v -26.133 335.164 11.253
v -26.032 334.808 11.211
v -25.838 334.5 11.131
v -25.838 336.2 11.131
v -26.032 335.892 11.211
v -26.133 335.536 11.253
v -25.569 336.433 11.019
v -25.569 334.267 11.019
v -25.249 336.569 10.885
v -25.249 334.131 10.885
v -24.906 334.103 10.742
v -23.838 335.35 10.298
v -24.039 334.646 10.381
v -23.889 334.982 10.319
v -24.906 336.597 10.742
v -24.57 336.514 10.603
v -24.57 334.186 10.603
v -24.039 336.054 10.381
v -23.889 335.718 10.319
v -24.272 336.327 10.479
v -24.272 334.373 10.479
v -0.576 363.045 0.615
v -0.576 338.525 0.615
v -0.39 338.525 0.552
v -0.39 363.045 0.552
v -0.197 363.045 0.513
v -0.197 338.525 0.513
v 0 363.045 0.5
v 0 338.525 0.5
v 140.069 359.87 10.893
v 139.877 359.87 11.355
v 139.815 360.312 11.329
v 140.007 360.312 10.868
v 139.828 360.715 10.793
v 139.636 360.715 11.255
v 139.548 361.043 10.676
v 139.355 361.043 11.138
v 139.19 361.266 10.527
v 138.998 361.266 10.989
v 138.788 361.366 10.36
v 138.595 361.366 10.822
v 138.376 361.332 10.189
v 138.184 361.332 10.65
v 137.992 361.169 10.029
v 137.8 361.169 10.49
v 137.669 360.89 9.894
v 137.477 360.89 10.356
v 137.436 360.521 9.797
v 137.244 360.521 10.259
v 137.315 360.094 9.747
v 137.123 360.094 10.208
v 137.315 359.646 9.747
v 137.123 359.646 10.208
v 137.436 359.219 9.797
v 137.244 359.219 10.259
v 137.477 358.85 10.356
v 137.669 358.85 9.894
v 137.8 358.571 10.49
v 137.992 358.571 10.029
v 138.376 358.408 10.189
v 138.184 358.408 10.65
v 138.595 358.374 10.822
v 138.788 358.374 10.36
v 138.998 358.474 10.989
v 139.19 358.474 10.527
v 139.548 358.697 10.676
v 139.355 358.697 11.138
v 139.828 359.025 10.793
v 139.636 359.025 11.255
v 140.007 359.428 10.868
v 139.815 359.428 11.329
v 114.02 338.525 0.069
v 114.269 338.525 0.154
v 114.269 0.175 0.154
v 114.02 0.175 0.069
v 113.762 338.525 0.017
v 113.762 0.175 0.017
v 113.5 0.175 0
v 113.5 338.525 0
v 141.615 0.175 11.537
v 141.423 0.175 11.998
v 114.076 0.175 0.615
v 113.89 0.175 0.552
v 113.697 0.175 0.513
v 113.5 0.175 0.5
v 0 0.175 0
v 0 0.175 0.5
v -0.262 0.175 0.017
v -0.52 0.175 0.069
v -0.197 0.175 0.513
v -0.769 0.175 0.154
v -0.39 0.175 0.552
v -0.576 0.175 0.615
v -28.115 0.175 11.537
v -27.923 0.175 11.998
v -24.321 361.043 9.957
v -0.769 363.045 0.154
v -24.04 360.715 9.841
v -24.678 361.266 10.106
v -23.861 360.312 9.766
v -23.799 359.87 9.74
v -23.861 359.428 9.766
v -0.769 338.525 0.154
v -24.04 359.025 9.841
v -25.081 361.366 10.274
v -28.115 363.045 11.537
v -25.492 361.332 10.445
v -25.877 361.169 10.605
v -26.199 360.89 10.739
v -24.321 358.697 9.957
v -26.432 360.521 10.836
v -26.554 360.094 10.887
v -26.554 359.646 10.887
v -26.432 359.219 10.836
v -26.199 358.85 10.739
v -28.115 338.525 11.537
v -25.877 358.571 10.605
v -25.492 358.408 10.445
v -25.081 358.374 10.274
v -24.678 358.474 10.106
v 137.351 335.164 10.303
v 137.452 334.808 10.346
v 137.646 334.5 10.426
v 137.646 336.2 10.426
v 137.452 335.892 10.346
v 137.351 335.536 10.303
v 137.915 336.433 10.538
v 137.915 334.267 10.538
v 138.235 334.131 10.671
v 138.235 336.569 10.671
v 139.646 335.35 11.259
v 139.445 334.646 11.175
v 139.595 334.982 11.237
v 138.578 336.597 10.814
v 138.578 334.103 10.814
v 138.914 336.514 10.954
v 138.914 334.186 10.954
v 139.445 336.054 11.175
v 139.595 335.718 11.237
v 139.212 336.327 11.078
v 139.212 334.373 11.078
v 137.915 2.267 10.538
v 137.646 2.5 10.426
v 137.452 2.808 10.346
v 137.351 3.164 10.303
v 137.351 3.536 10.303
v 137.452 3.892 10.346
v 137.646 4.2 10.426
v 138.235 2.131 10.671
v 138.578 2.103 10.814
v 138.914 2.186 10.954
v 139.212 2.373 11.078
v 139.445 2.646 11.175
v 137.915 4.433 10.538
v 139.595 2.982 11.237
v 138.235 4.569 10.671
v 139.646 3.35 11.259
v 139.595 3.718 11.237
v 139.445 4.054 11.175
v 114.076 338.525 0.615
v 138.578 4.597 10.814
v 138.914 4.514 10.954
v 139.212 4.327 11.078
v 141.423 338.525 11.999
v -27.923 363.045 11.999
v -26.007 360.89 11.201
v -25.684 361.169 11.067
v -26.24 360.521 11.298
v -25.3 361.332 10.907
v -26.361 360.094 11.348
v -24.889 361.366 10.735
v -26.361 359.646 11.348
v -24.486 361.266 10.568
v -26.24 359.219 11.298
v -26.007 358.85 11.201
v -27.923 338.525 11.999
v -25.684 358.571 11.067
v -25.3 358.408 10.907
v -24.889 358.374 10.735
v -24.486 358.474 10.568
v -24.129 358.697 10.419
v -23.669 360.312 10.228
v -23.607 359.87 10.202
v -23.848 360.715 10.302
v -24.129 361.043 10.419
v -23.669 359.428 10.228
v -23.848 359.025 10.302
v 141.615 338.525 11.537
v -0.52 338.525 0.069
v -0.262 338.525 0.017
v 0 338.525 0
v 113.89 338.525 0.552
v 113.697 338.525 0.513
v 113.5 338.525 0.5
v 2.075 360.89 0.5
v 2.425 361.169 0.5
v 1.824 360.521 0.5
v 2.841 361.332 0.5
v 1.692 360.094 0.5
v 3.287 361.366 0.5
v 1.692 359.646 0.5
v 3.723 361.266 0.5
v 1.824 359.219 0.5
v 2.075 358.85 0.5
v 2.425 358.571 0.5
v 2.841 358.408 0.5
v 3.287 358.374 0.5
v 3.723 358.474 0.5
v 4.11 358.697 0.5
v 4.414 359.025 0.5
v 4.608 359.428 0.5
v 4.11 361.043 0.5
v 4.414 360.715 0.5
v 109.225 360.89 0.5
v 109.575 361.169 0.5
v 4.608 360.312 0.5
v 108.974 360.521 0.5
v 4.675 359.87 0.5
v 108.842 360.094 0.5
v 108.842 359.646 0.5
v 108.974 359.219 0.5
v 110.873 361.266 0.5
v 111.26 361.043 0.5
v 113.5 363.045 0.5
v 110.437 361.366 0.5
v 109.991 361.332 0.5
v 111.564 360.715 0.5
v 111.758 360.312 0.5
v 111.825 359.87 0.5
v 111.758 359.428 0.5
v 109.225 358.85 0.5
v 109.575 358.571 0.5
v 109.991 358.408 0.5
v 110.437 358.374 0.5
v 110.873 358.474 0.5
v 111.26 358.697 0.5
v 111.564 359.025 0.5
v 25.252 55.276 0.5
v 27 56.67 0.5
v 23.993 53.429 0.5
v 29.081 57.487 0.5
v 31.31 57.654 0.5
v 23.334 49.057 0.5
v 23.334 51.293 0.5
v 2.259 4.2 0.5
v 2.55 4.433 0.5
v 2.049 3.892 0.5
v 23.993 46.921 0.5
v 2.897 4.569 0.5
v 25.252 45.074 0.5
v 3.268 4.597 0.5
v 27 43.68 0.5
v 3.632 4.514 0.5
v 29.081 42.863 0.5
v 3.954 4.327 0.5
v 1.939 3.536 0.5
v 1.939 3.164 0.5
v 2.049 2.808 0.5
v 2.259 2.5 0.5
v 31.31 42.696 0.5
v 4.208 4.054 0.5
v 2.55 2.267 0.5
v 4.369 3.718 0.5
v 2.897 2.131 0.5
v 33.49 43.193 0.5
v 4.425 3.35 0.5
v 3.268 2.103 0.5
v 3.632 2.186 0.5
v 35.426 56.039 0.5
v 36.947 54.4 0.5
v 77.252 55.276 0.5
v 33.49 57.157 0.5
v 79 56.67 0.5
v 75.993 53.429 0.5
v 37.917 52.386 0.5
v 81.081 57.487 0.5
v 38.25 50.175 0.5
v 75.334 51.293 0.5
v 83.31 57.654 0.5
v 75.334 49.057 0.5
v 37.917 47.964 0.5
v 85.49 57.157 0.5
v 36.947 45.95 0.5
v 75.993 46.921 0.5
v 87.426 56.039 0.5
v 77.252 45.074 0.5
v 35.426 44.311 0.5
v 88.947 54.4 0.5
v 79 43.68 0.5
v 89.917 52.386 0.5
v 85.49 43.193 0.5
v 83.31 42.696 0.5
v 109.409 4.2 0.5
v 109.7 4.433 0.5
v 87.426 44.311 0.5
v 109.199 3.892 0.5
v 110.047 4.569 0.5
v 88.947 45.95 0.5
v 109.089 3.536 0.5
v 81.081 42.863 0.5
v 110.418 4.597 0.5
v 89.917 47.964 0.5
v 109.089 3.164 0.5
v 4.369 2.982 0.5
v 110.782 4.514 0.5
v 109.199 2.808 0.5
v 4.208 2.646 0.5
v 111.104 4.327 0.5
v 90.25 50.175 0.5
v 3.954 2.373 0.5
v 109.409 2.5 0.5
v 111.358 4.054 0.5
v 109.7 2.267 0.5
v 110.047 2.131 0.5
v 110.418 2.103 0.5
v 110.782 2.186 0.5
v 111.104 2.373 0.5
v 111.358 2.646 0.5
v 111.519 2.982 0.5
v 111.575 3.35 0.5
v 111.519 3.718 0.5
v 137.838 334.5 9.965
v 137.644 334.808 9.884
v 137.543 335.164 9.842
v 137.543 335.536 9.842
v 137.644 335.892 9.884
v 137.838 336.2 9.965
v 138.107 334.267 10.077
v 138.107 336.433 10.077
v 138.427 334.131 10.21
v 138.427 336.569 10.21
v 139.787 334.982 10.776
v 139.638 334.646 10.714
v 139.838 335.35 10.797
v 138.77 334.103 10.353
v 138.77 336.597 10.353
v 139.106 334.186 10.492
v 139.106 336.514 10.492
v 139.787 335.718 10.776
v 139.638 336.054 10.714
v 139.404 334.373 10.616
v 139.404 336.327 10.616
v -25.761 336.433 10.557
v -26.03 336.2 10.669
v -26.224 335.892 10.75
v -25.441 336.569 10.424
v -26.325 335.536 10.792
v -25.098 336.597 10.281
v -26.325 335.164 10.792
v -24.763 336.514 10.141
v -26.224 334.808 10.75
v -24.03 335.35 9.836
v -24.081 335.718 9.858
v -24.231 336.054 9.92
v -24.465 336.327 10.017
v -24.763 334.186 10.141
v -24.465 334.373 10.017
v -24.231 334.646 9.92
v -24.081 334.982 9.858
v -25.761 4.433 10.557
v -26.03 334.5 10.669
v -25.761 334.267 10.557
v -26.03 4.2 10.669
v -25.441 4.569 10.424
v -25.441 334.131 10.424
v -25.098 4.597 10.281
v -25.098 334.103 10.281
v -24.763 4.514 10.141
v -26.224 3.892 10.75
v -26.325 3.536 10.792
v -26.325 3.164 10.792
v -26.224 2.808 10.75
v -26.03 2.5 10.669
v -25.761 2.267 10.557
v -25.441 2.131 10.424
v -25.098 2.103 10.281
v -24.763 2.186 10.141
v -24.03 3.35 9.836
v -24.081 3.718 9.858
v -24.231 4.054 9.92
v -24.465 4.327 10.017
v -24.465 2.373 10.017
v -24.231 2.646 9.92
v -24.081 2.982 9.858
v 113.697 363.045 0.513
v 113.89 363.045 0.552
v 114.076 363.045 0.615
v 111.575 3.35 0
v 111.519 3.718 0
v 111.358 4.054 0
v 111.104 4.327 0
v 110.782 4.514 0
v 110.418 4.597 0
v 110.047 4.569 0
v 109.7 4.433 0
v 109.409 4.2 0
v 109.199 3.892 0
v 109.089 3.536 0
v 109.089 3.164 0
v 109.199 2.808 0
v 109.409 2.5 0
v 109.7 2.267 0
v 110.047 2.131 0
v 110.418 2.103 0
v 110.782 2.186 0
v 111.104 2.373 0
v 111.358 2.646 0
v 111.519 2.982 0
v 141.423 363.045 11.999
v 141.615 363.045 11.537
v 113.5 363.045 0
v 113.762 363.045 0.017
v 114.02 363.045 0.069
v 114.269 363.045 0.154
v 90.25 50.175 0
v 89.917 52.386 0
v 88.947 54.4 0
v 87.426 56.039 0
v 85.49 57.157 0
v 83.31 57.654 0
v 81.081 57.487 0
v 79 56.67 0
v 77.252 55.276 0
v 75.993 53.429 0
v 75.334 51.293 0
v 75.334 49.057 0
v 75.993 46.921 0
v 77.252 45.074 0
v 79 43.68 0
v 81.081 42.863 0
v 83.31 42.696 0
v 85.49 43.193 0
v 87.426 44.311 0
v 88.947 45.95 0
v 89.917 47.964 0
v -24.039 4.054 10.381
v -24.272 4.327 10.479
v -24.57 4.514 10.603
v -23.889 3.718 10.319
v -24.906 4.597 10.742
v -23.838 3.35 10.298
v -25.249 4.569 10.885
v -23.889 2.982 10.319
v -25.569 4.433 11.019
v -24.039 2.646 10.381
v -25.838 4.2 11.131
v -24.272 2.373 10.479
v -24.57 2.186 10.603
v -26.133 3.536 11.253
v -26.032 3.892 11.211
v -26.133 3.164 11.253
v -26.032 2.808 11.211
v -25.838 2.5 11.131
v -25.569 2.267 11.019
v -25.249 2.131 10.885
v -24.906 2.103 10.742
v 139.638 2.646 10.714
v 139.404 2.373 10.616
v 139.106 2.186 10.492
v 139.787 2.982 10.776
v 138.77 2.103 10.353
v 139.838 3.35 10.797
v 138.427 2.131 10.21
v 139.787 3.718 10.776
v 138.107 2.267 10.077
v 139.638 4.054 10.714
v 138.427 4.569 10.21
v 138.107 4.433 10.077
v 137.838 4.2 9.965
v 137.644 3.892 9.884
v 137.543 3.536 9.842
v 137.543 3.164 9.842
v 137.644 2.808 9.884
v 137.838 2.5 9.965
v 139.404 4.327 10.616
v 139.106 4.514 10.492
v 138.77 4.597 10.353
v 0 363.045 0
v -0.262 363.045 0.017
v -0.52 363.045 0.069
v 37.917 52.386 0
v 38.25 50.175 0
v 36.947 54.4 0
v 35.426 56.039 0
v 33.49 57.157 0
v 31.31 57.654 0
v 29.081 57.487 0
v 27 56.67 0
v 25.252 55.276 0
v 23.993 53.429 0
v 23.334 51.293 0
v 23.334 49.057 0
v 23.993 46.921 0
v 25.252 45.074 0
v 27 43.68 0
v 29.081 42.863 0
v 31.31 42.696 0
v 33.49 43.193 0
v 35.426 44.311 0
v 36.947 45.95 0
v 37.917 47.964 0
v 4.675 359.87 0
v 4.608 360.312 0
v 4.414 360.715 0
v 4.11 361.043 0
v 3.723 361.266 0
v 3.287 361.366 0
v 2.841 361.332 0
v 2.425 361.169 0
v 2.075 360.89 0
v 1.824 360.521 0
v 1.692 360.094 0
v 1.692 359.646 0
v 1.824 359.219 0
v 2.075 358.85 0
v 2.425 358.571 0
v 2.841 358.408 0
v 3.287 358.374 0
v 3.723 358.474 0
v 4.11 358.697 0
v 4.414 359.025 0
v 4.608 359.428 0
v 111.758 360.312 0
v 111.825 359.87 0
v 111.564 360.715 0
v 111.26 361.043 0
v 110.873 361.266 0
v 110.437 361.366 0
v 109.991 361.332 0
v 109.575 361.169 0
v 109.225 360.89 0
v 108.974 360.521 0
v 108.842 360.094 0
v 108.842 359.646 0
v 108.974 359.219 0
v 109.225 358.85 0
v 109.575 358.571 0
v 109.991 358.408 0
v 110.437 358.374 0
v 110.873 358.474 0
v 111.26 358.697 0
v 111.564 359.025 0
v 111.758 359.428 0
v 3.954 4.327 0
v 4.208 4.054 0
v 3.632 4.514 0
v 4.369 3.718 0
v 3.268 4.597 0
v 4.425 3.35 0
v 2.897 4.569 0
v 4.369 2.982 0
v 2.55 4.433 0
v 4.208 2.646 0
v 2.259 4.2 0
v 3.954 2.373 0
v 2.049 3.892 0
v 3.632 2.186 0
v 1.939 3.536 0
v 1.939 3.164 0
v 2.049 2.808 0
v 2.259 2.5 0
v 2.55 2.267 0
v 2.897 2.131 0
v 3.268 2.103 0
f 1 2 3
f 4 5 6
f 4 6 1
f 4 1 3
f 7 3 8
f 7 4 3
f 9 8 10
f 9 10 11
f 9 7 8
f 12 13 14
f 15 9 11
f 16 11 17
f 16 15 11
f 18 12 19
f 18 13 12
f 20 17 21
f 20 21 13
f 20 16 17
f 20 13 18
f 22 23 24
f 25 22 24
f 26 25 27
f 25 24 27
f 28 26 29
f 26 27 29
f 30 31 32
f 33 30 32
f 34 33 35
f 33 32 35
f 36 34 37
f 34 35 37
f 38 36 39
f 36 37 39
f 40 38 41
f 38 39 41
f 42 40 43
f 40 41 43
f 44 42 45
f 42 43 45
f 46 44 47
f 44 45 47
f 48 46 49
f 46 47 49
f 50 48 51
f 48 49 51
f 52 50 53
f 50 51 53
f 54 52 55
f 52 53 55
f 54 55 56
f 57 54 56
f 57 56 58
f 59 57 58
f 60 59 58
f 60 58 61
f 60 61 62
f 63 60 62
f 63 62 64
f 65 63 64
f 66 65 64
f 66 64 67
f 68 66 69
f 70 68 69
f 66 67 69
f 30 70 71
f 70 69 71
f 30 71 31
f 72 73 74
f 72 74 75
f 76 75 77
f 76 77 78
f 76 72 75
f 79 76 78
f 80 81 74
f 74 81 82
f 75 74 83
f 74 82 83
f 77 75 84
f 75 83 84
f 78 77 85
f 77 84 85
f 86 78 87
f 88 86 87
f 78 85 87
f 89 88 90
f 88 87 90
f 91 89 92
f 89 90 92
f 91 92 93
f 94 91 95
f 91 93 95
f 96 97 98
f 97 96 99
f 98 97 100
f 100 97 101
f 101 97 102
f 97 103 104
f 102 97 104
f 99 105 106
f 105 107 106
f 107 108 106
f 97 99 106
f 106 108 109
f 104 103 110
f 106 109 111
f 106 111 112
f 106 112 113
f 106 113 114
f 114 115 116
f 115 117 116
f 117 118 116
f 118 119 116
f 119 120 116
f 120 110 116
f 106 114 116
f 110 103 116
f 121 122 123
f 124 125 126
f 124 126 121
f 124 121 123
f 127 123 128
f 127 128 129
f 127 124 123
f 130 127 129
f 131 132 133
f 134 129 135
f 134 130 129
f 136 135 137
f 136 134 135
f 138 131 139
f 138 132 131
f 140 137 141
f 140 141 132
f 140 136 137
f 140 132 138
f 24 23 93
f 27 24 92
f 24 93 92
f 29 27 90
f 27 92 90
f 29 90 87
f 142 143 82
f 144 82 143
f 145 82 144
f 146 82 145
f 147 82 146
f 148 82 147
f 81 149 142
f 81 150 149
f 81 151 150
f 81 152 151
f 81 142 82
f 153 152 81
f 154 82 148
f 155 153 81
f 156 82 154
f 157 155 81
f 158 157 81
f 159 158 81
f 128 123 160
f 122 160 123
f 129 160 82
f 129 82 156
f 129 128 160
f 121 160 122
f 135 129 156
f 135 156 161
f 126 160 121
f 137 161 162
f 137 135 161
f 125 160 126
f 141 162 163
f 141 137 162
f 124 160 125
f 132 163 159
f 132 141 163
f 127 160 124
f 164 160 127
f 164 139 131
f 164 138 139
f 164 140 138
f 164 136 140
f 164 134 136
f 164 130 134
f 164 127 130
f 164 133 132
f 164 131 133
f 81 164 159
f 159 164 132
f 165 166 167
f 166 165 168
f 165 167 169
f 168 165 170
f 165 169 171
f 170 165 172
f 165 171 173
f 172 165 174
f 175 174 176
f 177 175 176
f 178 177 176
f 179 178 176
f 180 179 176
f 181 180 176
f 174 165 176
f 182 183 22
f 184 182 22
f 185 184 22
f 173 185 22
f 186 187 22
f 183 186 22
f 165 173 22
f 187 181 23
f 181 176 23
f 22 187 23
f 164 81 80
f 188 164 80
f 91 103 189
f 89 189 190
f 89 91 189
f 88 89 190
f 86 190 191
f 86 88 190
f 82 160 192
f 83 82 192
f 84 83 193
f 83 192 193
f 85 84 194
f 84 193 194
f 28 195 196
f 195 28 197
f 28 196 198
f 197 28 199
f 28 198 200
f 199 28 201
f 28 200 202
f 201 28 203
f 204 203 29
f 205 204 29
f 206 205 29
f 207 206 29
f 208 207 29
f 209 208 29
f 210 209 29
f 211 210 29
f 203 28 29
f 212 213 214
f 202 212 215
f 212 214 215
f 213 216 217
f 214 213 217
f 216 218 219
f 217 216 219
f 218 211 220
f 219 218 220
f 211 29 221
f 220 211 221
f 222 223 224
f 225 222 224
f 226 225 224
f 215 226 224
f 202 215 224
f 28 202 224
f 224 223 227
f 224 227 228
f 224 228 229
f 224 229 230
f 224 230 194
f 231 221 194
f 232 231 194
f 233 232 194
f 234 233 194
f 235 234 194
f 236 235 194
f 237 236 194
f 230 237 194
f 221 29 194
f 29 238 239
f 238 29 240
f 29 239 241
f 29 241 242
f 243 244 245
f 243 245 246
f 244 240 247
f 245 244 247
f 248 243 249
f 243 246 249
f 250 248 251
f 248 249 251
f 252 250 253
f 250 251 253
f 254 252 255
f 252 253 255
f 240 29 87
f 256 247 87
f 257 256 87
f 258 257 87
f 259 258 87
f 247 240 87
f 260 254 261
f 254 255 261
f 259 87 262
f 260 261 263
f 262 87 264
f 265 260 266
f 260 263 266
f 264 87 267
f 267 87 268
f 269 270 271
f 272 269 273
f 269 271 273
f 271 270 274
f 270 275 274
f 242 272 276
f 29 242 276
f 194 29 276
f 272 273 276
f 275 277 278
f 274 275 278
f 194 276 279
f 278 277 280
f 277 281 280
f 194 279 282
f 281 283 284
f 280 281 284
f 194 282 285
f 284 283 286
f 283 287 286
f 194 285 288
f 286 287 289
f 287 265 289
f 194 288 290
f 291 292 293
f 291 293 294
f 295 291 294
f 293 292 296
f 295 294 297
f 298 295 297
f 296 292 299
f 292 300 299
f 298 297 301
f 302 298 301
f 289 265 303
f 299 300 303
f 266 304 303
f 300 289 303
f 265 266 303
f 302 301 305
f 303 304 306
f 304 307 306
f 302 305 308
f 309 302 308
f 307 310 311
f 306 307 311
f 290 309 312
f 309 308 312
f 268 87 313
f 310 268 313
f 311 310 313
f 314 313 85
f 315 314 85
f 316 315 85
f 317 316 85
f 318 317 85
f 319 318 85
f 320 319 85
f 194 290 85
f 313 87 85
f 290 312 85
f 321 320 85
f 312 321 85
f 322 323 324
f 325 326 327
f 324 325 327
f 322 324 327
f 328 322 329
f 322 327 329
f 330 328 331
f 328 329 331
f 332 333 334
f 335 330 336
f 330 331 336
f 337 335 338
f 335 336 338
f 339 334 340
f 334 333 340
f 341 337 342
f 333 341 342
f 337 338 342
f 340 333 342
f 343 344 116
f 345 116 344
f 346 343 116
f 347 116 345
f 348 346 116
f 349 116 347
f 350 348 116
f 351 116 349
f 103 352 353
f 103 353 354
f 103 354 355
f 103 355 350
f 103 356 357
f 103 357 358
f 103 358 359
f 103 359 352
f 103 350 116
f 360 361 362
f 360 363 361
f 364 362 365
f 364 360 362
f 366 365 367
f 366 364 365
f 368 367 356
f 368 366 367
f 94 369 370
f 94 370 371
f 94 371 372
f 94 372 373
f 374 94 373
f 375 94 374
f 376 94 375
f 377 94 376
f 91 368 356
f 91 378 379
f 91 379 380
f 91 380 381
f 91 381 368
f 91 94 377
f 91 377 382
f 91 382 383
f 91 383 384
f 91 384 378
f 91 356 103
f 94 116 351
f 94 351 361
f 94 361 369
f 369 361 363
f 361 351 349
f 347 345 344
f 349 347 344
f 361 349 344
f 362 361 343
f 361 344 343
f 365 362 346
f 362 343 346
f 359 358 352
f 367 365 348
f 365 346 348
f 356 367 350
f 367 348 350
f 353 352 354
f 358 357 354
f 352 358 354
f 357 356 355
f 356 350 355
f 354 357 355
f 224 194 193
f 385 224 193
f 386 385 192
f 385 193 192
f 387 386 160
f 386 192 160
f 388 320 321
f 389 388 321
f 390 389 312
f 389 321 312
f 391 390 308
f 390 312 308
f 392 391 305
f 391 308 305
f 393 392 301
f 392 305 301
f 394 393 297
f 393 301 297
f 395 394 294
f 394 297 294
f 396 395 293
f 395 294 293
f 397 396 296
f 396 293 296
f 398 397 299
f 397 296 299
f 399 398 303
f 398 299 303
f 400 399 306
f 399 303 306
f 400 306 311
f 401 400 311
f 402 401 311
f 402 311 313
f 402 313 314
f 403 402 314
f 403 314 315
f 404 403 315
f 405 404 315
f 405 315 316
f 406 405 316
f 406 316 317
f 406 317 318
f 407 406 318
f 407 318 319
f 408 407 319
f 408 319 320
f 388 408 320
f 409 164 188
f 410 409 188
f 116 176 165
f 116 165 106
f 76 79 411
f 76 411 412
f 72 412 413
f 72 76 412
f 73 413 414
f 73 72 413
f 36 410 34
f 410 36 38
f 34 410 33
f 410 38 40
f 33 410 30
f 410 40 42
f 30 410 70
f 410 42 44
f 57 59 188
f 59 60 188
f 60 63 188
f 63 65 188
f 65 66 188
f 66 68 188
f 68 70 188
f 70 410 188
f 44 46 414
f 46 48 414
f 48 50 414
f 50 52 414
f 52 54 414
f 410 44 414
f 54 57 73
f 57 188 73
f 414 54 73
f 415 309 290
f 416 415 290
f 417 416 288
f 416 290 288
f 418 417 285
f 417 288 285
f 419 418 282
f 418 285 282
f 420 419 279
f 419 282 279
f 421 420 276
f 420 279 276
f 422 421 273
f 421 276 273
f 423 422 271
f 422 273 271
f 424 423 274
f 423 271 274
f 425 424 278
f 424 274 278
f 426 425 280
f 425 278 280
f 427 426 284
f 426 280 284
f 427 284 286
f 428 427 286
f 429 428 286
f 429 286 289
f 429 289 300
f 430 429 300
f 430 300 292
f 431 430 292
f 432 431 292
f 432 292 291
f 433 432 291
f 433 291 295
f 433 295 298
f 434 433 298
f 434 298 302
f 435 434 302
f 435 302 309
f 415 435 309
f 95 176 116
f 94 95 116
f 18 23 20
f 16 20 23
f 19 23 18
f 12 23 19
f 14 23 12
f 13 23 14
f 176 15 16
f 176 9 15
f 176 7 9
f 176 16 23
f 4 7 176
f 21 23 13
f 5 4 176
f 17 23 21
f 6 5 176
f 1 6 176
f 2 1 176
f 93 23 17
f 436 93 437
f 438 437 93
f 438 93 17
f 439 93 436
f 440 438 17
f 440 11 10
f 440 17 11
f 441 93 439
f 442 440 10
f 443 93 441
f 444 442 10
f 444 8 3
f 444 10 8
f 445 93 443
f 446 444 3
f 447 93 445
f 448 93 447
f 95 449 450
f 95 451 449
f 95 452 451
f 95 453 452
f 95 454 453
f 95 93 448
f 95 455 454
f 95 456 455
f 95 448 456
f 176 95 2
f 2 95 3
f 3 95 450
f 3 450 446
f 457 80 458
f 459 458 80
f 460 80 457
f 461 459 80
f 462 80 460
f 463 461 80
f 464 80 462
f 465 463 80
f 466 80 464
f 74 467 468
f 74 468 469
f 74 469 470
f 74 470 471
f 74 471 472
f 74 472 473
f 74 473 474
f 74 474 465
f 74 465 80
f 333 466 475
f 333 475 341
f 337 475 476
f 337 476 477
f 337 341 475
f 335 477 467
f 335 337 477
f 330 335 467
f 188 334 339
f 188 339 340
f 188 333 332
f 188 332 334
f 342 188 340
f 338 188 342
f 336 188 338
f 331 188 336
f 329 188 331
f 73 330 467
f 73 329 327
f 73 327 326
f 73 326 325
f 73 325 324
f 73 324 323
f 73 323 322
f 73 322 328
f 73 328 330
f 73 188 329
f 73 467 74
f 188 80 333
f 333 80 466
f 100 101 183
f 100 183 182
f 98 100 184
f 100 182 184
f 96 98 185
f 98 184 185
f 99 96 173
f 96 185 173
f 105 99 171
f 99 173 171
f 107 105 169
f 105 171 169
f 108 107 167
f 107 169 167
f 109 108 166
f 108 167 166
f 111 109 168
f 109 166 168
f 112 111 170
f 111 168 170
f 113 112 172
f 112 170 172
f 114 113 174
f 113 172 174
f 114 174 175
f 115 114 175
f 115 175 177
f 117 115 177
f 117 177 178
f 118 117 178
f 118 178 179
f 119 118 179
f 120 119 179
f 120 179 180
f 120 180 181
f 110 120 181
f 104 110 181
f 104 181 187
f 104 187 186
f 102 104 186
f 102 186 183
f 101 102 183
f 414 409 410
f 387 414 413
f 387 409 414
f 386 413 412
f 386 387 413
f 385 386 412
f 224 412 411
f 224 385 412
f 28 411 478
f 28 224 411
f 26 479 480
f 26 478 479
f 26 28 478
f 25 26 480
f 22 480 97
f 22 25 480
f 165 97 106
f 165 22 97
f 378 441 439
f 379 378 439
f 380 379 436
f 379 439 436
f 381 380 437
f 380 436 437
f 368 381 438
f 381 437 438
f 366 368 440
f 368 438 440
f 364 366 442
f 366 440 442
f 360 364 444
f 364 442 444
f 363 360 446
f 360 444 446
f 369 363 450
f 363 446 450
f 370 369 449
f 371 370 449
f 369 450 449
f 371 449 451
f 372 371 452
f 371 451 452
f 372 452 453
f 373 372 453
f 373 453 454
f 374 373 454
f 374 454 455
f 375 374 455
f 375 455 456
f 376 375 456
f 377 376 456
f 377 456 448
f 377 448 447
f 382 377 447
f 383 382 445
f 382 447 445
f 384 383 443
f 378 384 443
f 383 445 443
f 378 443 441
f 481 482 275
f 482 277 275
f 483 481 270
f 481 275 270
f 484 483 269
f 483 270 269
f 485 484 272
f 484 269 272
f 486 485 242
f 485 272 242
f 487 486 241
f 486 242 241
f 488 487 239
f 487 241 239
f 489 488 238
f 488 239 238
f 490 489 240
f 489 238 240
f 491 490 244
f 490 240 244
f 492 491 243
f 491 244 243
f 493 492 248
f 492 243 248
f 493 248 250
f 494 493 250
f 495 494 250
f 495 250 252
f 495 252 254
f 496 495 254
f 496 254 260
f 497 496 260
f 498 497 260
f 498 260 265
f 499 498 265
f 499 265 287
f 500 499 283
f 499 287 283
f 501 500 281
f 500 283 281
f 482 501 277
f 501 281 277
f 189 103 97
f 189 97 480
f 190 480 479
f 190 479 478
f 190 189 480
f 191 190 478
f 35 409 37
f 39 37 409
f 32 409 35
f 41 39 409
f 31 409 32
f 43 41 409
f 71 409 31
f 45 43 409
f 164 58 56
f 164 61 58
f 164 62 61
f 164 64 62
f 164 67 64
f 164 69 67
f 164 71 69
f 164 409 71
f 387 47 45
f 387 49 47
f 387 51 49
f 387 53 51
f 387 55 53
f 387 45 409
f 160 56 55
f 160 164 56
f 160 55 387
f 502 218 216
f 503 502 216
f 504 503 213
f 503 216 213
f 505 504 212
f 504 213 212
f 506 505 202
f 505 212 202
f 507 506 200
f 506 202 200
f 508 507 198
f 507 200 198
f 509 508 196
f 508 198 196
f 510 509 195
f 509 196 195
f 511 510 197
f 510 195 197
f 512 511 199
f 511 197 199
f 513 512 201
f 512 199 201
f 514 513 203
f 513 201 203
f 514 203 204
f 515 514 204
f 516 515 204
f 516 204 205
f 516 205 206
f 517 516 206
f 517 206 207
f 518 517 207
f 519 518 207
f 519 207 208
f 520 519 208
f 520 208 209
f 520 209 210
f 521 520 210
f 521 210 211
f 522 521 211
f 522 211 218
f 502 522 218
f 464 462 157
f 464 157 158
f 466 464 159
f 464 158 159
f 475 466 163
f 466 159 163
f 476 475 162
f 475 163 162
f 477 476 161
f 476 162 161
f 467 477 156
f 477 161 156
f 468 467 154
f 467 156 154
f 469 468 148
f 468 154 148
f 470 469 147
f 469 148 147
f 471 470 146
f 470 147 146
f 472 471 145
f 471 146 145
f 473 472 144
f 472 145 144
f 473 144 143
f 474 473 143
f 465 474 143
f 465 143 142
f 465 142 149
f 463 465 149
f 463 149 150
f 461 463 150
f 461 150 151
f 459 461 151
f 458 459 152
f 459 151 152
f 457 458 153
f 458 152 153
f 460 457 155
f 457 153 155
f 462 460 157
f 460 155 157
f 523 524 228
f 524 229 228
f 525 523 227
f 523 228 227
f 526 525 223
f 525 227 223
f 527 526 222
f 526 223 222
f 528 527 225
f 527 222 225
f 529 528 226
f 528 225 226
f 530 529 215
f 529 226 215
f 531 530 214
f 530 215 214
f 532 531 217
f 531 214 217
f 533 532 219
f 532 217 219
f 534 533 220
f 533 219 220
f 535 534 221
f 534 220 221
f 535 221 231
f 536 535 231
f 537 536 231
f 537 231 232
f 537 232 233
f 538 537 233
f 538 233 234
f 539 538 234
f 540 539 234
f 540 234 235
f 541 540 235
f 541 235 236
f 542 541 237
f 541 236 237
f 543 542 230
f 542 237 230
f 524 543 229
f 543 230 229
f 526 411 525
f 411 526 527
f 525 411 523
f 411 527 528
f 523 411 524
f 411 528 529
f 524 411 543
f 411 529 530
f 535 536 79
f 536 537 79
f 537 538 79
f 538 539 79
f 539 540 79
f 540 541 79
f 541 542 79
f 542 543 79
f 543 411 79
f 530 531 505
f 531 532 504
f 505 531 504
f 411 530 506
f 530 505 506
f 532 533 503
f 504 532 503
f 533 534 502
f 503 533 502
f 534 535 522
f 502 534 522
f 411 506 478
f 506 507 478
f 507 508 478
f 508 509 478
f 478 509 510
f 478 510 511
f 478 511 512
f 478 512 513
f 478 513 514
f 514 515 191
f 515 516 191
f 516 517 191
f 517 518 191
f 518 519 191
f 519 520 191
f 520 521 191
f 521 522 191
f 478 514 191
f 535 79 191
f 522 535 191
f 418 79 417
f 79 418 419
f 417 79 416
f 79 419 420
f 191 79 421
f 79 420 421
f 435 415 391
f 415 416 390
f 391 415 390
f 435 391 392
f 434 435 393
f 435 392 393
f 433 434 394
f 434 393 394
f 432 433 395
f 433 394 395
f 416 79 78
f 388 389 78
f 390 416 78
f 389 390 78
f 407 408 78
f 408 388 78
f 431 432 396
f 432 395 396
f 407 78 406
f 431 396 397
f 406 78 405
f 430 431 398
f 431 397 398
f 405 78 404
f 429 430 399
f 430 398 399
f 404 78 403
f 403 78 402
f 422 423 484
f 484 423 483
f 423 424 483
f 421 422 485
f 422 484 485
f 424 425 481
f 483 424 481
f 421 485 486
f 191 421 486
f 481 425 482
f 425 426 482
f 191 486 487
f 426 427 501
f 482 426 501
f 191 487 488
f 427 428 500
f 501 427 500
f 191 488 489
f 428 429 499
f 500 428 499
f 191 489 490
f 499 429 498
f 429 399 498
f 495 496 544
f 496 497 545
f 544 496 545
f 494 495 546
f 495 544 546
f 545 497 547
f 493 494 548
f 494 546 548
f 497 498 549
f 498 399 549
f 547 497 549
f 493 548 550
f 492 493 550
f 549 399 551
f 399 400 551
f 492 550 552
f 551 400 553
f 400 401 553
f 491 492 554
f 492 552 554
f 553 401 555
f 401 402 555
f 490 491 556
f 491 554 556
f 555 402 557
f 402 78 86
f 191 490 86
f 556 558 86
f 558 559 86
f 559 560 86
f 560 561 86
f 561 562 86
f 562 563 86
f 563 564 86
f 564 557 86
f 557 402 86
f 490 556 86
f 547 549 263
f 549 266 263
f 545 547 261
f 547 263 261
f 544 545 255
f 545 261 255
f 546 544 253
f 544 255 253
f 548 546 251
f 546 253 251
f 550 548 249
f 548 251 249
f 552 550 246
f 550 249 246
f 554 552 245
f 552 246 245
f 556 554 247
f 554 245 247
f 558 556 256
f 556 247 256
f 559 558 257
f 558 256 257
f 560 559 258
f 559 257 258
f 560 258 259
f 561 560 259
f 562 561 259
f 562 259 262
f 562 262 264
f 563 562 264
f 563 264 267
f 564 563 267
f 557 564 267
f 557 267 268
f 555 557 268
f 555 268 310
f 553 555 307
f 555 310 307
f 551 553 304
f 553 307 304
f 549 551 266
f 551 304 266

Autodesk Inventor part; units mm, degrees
ref_plane "YZ Plane" through (0, 0, 0) normal (1, 0, 0) x (0, 1, 0)
ref_plane "XZ Plane" through (0, 0, 0) normal (0, 1, 0) x (-1, 0, 0)
ref_plane "XY Plane" through (0, 0, 0) normal (0, 0, 1) x (1, 0, 0)
sketch "Sketch1" plane through (0, 0, 0) normal (0, 0, 1) x (1, 0, 0)
  line L0 (0, 0) -> (113.5, 0)
  line L1 (113.5, 0) -> (113.5, 338.525)
  line L2 (113.5, 338.525) -> (0, 338.525)
  line L3 (0, 338.525) -> (0, 0)
  dimension "d0" = 113.5
  dimension "d1" = 338.525
extrude "Plate1" add sketch "Sketch1" along normal blind 0.5
sketch "Sketch2" plane through (114.0764, 338.525, 0.6152) normal (0.3842953, 0, -0.9232102) x (0, 1, 0)
  line L0 (-338.525, 0) -> (0, 0)
  line L1 (0, 0) -> (0, 29.6214)
  line L2 (0, 29.6214) -> (-338.525, 29.6214)
  line L3 (-338.525, 29.6214) -> (-338.525, 0)
edge flange "Flange1" height 30.021 angle 22.6 thickness 0.5 bend radius 1.5 thickness toward (0.3842953, 0, -0.9232102) relief tear relief width 0.5 relief depth 0.25 edges at (113.5, 169.2625, 0.5) wall of the first edge with corners at (114.0764, 0, 0.6152) (114.0764, 338.525, 0.6152) (141.4232, 338.525, 11.9985) (141.4232, 0, 11.9985)
bend "Bend1"
corner "Corner1"
sketch "Sketch3" plane through (-0.5764, 0, 0.6152) normal (-0.3842953, 0, -0.9232102) x (0, -1, 0)
  line L0 (-338.525, 0) -> (0, 0)
  line L1 (0, 0) -> (0, 29.6214)
  line L2 (0, 29.6214) -> (-338.525, 29.6214)
  line L3 (-338.525, 29.6214) -> (-338.525, 0)
edge flange "Flange2" height 30.021 angle 22.6 thickness 0.5 bend radius 1.5 thickness toward (-0.3842953, 0, -0.9232102) relief tear relief width 0.5 relief depth 0.25 edges at (0, 169.2625, 0.5) wall of the first edge with corners at (-0.5764, 338.525, 0.6152) (-0.5764, 0, 0.6152) (-27.9232, 0, 11.9985) (-27.9232, 338.525, 11.9985)
bend "Bend2"
corner "Corner2"
sketch "Sketch4" plane through (-27.9232, 0, 11.9985) normal (0.3842953, 0, 0.9232102) x (0.9232102, 0, -0.3842953)
  line L0 (0, 338.525) -> (0, 0) projected
  line L1 (0, 338.525) -> (0, 335.35) construction
  line L2 (0, 335.35) -> (3.175, 335.35) construction
  circle A0 centre (3.175, 335.35) radius 1.25
  line L3 (0, 0) -> (0, 3.175) construction
  line L4 (0, 3.175) -> (3.175, 3.175) construction
  line L5 (3.175, 3.175) -> (3.175, 3.35) construction
  circle A1 centre (3.175, 3.35) radius 1.25
  point P0 (30.39, 0)
  dimension "d23" = 3.175
  dimension "d24" = 3.175
  dimension "d25" = 2.5
  dimension "d26" = 3.175
  dimension "d27" = 3.175
  dimension "d62" = 0.175
  dimension "d63" = 2.5
extrude "Extrusion1" cut sketch "Sketch4" against normal blind 10
sketch "Sketch5" plane through (0, 0, 0.5) normal (0, 0, 1) x (1, 0, 0)
  line L0 (0, 0) -> (0, 338.525) projected
  line L1 (113.5, 0) -> (0, 0) projected
  line L2 (113.5, 338.525) -> (113.5, 0) projected
  line L3 (0, 338.525) -> (0, 335.35) construction
  line L4 (0, 335.35) -> (3.175, 335.35) construction
  line L5 (113.5, 338.525) -> (113.5, 335.35) construction
  line L6 (113.5, 335.35) -> (110.325, 335.35) construction
  line L7 (0, 0) -> (3.175, 0) construction
  line L8 (0, 0) -> (113.5, 0) construction
  line L9 (3.175, 0) -> (3.175, 3.175) construction
  line L10 (113.5, 0) -> (113.5, 3.175) construction
  line L11 (113.5, 3.175) -> (110.325, 3.175) construction
  circle A0 centre (3.175, 335.35) radius 1.25
  circle A1 centre (110.325, 335.35) radius 1.25
  line L12 (3.175, 3.175) -> (3.175, 3.35) construction
  line L13 (110.325, 3.175) -> (110.325, 3.35) construction
  circle A2 centre (110.325, 3.35) radius 1.25
  circle A3 centre (3.175, 3.35) radius 1.25
  dimension "d31" = 3.175
  dimension "d32" = 3.175
  dimension "d33" = 3.175
  dimension "d34" = 3.175
  dimension "d35" = 3.175
  dimension "d36" = 3.175
  dimension "d37" = 3.175
  dimension "d38" = 3.175
  dimension "d41" = 2.5
  dimension "d42" = 2.5
  dimension "d58" = 0.175
  dimension "d59" = 0.175
  dimension "d60" = 2.5
  dimension "d61" = 2.5
extrude "Extrusion2" cut sketch "Sketch5" against normal blind 10
sketch "Sketch6" plane through (141.4232, 0, 11.9985) normal (-0.3842953, 0, 0.9232102) x (0.9232102, 0, 0.3842953)
  line L0 (0, 338.525) -> (0, 335.35) construction
  line L1 (0, 0) -> (0, 338.525) construction
  line L2 (0, 335.35) -> (-3.175, 335.35) construction
  line L3 (0, 0) -> (0, 3.175) construction
  line L4 (0, 3.175) -> (-3.175, 3.175) construction
  circle A0 centre (-3.175, 335.35) radius 1.25
  line L5 (-3.175, 3.175) -> (-3.175, 3.35) construction
  circle A1 centre (-3.175, 3.35) radius 1.25
  point P0 (-135.1743, 0)
  dimension "d45" = 3.175
  dimension "d46" = 3.175
  dimension "d47" = 3.175
  dimension "d48" = 3.175
  dimension "d50" = 2.5
  dimension "d64" = 0.175
  dimension "d65" = 2.5
extrude "Extrusion3" cut sketch "Sketch6" against normal blind 10
sketch "Sketch7" plane through (0, 0, 0.5) normal (0, 0, 1) x (1, 0, 0)
  line L0 (-71.3896, 0) -> (266.456, 0)
  line L1 (266.456, 0) -> (266.456, 0.175)
  line L2 (266.456, 0.175) -> (-71.3896, 0.175)
  line L3 (-71.3896, 0.175) -> (-71.3896, 0)
  dimension "d53" = 0.175
extrude "Extrusion4" cut sketch "Sketch7" against normal blind 100 and the other way blind 100
sketch "Sketch9" plane through (-28.1153, 338.525, 11.5369) normal (0, 1, 0) x (0.9232102, 0, -0.3842953)
  line L0 (29.6214, -0.5) -> (29.6214, 0) projected
  line L1 (29.6214, 0) -> (0, 0) projected
  line L2 (0, -0.5) -> (0, 0) projected
  line L3 (0, -0.5) -> (29.6214, -0.5) projected
  point P0 (30.39, -0.1536)
extrude "Extrusion5" add sketch "Sketch9" along normal blind 30.87
sketch "Sketch10" plane through (0, 338.525, 0.5) normal (0, 1, 0) x (1, 0, 0)
  line L0 (-0.5764, -0.1152) -> (-0.7686, 0.3464) projected
  arc A0 (0, 0) -> (-0.5764, -0.1152) centre (0, -1.5) ccw projected
  line L1 (0, 0.5) -> (0, 0) projected
  arc A1 (0, 0.5) -> (-0.7686, 0.3464) centre (0, -1.5) ccw projected
extrude "Extrusion6" add sketch "Sketch10" along normal blind 30.87
sketch "Sketch11" plane through (0, 338.525, 0) normal (0, 1, 0) x (1, 0, 0)
  line L0 (0, -0.5) -> (113.5, -0.5) projected
  line L1 (113.5, 0) -> (113.5, -0.5) projected
  line L2 (113.5, 0) -> (0, 0) projected
  line L3 (0, 0) -> (0, -0.5) projected
extrude "Extrusion7" add sketch "Sketch11" along normal blind 30.87
sketch "Sketch12" plane through (113.5, 338.525, 0.5) normal (0, 1, 0) x (1, 0, 0)
  line L0 (0.7686, 0.3464) -> (0.5764, -0.1152) projected
  arc A0 (0.7686, 0.3464) -> (0, 0.5) centre (0, -1.5) ccw projected
  line L1 (0, 0.5) -> (0, 0) projected
  arc A1 (0.5764, -0.1152) -> (0, 0) centre (0, -1.5) ccw projected
  point P0 (-113.5, 0.5)
extrude "Extrusion8" add sketch "Sketch12" along normal blind 30.87
sketch "Sketch13" plane through (114.0764, 338.525, 0.6152) normal (0, 1, 0) x (0.9232102, 0, 0.3842953)
  line L0 (0, 0.5) -> (0, 0) projected
  line L1 (29.6214, 0) -> (0, 0) projected
  line L2 (29.6214, 0) -> (29.6214, 0.5) projected
  line L3 (29.6214, 0.5) -> (0, 0.5) projected
  point P0 (-105.553, -43.2711)
extrude "Extrusion9" add sketch "Sketch13" along normal blind 30.87
sketch "Sketch14" plane through (0, 0, 0.5) normal (0, 0, 1) x (1, 0, 0)
  circle A0 centre (3.175, 335.35) radius 1.25 projected
  point P0 (0, 0)
extrude "Extrusion10" add sketch "Sketch14" against normal up to surface (0.5 mm away)
sketch "Sketch15" plane through (0, 0, 0.5) normal (0, 0, 1) x (1, 0, 0)
  circle A0 centre (110.325, 335.35) radius 1.25 projected
  point P0 (0, 0)
extrude "Extrusion11" add sketch "Sketch15" against normal up to surface (0.5 mm away)
sketch "Sketch16" plane through (141.4232, 0.175, 11.9985) normal (-0.3842953, 0, 0.9232102) x (0.9232102, 0, 0.3842953)
  circle A0 centre (-3.175, 335.175) radius 1.25 projected
  point P0 (-135.1743, -0.175)
extrude "Extrusion12" add sketch "Sketch16" against normal up to surface (0.5 mm away)
sketch "Sketch17" plane through (-0.5764, 0.175, 0.6152) normal (0.3842953, 0, 0.9232102) x (0.9232102, 0, -0.3842953)
  circle A0 centre (-26.4464, 335.175) radius 1.25 projected
  point P0 (0.7686, -0.175)
extrude "Extrusion13" add sketch "Sketch17" against normal up to surface (0.5 mm away)
sketch "Sketch18" plane through (0, 0, 0.5) normal (0, 0, 1) x (1, 0, 0)
  line L0 (113.5, 0.175) -> (113.5, 369.395) projected
  line L1 (0, 0.175) -> (0, 369.395) projected
  line L2 (0, 369.395) -> (0, 359.87) construction
  line L3 (0, 359.87) -> (3.175, 359.87) construction
  circle A0 centre (3.175, 359.87) radius 1.5
  line L4 (113.5, 369.395) -> (113.5, 359.87) construction
  line L5 (113.5, 359.87) -> (110.325, 359.87) construction
  circle A1 centre (110.325, 359.87) radius 1.5
  point P0 (0, 0)
  dimension "d84" = 9.525
  dimension "d85" = 3.175
  dimension "d86" = 3
  dimension "d87" = 9.525
  dimension "d88" = 3.175
  dimension "d89" = 3
extrude "Extrusion14" cut sketch "Sketch18" against normal blind 30.87
sketch "Sketch19" plane through (-0.5764, 0.175, 0.6152) normal (0.3842953, 0, 0.9232102) x (0.9232102, 0, -0.3842953)
  line L0 (-29.6214, 369.22) -> (-29.6214, 0) projected
  line L1 (-29.6214, 369.22) -> (-29.6214, 359.695) construction
  line L2 (-29.6214, 359.695) -> (-26.4464, 359.695) construction
  circle A0 centre (-26.4464, 359.695) radius 1.5
  point P0 (0.7686, -0.175)
  dimension "d92" = 9.525
  dimension "d93" = 3.175
  dimension "d94" = 3
extrude "Extrusion15" cut sketch "Sketch19" against normal blind 30.87
sketch "Sketch20" plane through (141.4232, 0.175, 11.9985) normal (-0.3842953, 0, 0.9232102) x (0.9232102, 0, 0.3842953)
  line L0 (0, 0) -> (0, 369.22) projected
  line L1 (0, 369.22) -> (0, 359.695)
  line L2 (0, 359.695) -> (-3.175, 359.695)
  circle A0 centre (-3.175, 359.695) radius 1.5
  point P0 (-135.1743, -0.175)
  dimension "d97" = 9.525
  dimension "d98" = 3.175
  dimension "d99" = 3
extrude "Extrusion16" cut sketch "Sketch20" against normal blind 30.87
sketch "Sketch21" plane through (0, 0, 0.5) normal (0, 0, 1) x (1, 0, 0)
  line L0 (-35.0424, 369.395) -> (185.2939, 369.395)
  line L1 (185.2939, 369.395) -> (185.2939, 363.045)
  line L2 (185.2939, 363.045) -> (-35.0424, 363.045)
  line L3 (-35.0424, 363.045) -> (-35.0424, 369.395)
  point P0 (0, 0)
  dimension "d102" = 6.35
extrude "Extrusion17" cut sketch "Sketch21" against normal blind 30.87 and the other way blind 15.435
sketch "Sketch22" plane through (0, 0, 0.5) normal (0, 0, 1) x (1, 0, 0)
  line L0 (0, 0.175) -> (113.5, 0.175) projected
  line L1 (113.5, 0.175) -> (56.75, 0.175) construction
  line L2 (56.75, 0.175) -> (56.75, 50.175) construction
  line L3 (56.75, 50.175) -> (30.75, 50.175) construction
  circle A0 centre (30.75, 50.175) radius 7.5
  line L4 (56.75, 0.175) -> (56.75, 50.175) construction
  line L5 (56.75, 50.175) -> (82.75, 50.175) construction
  circle A1 centre (82.75, 50.175) radius 7.5
  point P0 (0, 0)
  dimension "d107" = 56.75
  dimension "d108" = 50
  dimension "d110" = 26
  dimension "d112" = 15
  dimension "d115" = 50
  dimension "d116" = 26
  dimension "d117" = 15
extrude "Extrusion18" cut sketch "Sketch22" against normal blind 10
equation "\"d2\" = Thickness"
equation "\"d3\" = BendReliefWidth"
equation "\"d4\" = BendReliefDepth"
equation "\"d5\" = MinimumRemnant"
equation "\"d6\" = TransitionRadius"
equation "\"d10\" = CornerReliefSize"
equation "\"d11\" = GapSize"
equation "\"d12\" = JacobiRadiusSize"
equation "\"d13\" = BendReliefWidth"
equation "\"d14\" = BendReliefDepth"
equation "\"d15\" = MinimumRemnant"
equation "\"d16\" = TransitionRadius"
equation "\"d20\" = CornerReliefSize"
equation "\"d21\" = GapSize"
equation "\"d22\" = JacobiRadiusSize"
equation "\"BendRadius\" = Thickness"
equation "\"BendReliefWidth\" = Thickness"
equation "\"BendReliefDepth\" = 0.5 * Thickness"
equation "\"CornerReliefSize\" = 4 * Thickness"
equation "\"MinimumRemnant\" = 2 * Thickness"
equation "\"TransitionRadius\" = BendRadius"
equation "\"JacobiRadiusSize\" = BendRadius"
equation "\"GapSize\" = Thickness"
equation "\"Thickness\" = 0.5"
properties part number "sideplate part 4"
